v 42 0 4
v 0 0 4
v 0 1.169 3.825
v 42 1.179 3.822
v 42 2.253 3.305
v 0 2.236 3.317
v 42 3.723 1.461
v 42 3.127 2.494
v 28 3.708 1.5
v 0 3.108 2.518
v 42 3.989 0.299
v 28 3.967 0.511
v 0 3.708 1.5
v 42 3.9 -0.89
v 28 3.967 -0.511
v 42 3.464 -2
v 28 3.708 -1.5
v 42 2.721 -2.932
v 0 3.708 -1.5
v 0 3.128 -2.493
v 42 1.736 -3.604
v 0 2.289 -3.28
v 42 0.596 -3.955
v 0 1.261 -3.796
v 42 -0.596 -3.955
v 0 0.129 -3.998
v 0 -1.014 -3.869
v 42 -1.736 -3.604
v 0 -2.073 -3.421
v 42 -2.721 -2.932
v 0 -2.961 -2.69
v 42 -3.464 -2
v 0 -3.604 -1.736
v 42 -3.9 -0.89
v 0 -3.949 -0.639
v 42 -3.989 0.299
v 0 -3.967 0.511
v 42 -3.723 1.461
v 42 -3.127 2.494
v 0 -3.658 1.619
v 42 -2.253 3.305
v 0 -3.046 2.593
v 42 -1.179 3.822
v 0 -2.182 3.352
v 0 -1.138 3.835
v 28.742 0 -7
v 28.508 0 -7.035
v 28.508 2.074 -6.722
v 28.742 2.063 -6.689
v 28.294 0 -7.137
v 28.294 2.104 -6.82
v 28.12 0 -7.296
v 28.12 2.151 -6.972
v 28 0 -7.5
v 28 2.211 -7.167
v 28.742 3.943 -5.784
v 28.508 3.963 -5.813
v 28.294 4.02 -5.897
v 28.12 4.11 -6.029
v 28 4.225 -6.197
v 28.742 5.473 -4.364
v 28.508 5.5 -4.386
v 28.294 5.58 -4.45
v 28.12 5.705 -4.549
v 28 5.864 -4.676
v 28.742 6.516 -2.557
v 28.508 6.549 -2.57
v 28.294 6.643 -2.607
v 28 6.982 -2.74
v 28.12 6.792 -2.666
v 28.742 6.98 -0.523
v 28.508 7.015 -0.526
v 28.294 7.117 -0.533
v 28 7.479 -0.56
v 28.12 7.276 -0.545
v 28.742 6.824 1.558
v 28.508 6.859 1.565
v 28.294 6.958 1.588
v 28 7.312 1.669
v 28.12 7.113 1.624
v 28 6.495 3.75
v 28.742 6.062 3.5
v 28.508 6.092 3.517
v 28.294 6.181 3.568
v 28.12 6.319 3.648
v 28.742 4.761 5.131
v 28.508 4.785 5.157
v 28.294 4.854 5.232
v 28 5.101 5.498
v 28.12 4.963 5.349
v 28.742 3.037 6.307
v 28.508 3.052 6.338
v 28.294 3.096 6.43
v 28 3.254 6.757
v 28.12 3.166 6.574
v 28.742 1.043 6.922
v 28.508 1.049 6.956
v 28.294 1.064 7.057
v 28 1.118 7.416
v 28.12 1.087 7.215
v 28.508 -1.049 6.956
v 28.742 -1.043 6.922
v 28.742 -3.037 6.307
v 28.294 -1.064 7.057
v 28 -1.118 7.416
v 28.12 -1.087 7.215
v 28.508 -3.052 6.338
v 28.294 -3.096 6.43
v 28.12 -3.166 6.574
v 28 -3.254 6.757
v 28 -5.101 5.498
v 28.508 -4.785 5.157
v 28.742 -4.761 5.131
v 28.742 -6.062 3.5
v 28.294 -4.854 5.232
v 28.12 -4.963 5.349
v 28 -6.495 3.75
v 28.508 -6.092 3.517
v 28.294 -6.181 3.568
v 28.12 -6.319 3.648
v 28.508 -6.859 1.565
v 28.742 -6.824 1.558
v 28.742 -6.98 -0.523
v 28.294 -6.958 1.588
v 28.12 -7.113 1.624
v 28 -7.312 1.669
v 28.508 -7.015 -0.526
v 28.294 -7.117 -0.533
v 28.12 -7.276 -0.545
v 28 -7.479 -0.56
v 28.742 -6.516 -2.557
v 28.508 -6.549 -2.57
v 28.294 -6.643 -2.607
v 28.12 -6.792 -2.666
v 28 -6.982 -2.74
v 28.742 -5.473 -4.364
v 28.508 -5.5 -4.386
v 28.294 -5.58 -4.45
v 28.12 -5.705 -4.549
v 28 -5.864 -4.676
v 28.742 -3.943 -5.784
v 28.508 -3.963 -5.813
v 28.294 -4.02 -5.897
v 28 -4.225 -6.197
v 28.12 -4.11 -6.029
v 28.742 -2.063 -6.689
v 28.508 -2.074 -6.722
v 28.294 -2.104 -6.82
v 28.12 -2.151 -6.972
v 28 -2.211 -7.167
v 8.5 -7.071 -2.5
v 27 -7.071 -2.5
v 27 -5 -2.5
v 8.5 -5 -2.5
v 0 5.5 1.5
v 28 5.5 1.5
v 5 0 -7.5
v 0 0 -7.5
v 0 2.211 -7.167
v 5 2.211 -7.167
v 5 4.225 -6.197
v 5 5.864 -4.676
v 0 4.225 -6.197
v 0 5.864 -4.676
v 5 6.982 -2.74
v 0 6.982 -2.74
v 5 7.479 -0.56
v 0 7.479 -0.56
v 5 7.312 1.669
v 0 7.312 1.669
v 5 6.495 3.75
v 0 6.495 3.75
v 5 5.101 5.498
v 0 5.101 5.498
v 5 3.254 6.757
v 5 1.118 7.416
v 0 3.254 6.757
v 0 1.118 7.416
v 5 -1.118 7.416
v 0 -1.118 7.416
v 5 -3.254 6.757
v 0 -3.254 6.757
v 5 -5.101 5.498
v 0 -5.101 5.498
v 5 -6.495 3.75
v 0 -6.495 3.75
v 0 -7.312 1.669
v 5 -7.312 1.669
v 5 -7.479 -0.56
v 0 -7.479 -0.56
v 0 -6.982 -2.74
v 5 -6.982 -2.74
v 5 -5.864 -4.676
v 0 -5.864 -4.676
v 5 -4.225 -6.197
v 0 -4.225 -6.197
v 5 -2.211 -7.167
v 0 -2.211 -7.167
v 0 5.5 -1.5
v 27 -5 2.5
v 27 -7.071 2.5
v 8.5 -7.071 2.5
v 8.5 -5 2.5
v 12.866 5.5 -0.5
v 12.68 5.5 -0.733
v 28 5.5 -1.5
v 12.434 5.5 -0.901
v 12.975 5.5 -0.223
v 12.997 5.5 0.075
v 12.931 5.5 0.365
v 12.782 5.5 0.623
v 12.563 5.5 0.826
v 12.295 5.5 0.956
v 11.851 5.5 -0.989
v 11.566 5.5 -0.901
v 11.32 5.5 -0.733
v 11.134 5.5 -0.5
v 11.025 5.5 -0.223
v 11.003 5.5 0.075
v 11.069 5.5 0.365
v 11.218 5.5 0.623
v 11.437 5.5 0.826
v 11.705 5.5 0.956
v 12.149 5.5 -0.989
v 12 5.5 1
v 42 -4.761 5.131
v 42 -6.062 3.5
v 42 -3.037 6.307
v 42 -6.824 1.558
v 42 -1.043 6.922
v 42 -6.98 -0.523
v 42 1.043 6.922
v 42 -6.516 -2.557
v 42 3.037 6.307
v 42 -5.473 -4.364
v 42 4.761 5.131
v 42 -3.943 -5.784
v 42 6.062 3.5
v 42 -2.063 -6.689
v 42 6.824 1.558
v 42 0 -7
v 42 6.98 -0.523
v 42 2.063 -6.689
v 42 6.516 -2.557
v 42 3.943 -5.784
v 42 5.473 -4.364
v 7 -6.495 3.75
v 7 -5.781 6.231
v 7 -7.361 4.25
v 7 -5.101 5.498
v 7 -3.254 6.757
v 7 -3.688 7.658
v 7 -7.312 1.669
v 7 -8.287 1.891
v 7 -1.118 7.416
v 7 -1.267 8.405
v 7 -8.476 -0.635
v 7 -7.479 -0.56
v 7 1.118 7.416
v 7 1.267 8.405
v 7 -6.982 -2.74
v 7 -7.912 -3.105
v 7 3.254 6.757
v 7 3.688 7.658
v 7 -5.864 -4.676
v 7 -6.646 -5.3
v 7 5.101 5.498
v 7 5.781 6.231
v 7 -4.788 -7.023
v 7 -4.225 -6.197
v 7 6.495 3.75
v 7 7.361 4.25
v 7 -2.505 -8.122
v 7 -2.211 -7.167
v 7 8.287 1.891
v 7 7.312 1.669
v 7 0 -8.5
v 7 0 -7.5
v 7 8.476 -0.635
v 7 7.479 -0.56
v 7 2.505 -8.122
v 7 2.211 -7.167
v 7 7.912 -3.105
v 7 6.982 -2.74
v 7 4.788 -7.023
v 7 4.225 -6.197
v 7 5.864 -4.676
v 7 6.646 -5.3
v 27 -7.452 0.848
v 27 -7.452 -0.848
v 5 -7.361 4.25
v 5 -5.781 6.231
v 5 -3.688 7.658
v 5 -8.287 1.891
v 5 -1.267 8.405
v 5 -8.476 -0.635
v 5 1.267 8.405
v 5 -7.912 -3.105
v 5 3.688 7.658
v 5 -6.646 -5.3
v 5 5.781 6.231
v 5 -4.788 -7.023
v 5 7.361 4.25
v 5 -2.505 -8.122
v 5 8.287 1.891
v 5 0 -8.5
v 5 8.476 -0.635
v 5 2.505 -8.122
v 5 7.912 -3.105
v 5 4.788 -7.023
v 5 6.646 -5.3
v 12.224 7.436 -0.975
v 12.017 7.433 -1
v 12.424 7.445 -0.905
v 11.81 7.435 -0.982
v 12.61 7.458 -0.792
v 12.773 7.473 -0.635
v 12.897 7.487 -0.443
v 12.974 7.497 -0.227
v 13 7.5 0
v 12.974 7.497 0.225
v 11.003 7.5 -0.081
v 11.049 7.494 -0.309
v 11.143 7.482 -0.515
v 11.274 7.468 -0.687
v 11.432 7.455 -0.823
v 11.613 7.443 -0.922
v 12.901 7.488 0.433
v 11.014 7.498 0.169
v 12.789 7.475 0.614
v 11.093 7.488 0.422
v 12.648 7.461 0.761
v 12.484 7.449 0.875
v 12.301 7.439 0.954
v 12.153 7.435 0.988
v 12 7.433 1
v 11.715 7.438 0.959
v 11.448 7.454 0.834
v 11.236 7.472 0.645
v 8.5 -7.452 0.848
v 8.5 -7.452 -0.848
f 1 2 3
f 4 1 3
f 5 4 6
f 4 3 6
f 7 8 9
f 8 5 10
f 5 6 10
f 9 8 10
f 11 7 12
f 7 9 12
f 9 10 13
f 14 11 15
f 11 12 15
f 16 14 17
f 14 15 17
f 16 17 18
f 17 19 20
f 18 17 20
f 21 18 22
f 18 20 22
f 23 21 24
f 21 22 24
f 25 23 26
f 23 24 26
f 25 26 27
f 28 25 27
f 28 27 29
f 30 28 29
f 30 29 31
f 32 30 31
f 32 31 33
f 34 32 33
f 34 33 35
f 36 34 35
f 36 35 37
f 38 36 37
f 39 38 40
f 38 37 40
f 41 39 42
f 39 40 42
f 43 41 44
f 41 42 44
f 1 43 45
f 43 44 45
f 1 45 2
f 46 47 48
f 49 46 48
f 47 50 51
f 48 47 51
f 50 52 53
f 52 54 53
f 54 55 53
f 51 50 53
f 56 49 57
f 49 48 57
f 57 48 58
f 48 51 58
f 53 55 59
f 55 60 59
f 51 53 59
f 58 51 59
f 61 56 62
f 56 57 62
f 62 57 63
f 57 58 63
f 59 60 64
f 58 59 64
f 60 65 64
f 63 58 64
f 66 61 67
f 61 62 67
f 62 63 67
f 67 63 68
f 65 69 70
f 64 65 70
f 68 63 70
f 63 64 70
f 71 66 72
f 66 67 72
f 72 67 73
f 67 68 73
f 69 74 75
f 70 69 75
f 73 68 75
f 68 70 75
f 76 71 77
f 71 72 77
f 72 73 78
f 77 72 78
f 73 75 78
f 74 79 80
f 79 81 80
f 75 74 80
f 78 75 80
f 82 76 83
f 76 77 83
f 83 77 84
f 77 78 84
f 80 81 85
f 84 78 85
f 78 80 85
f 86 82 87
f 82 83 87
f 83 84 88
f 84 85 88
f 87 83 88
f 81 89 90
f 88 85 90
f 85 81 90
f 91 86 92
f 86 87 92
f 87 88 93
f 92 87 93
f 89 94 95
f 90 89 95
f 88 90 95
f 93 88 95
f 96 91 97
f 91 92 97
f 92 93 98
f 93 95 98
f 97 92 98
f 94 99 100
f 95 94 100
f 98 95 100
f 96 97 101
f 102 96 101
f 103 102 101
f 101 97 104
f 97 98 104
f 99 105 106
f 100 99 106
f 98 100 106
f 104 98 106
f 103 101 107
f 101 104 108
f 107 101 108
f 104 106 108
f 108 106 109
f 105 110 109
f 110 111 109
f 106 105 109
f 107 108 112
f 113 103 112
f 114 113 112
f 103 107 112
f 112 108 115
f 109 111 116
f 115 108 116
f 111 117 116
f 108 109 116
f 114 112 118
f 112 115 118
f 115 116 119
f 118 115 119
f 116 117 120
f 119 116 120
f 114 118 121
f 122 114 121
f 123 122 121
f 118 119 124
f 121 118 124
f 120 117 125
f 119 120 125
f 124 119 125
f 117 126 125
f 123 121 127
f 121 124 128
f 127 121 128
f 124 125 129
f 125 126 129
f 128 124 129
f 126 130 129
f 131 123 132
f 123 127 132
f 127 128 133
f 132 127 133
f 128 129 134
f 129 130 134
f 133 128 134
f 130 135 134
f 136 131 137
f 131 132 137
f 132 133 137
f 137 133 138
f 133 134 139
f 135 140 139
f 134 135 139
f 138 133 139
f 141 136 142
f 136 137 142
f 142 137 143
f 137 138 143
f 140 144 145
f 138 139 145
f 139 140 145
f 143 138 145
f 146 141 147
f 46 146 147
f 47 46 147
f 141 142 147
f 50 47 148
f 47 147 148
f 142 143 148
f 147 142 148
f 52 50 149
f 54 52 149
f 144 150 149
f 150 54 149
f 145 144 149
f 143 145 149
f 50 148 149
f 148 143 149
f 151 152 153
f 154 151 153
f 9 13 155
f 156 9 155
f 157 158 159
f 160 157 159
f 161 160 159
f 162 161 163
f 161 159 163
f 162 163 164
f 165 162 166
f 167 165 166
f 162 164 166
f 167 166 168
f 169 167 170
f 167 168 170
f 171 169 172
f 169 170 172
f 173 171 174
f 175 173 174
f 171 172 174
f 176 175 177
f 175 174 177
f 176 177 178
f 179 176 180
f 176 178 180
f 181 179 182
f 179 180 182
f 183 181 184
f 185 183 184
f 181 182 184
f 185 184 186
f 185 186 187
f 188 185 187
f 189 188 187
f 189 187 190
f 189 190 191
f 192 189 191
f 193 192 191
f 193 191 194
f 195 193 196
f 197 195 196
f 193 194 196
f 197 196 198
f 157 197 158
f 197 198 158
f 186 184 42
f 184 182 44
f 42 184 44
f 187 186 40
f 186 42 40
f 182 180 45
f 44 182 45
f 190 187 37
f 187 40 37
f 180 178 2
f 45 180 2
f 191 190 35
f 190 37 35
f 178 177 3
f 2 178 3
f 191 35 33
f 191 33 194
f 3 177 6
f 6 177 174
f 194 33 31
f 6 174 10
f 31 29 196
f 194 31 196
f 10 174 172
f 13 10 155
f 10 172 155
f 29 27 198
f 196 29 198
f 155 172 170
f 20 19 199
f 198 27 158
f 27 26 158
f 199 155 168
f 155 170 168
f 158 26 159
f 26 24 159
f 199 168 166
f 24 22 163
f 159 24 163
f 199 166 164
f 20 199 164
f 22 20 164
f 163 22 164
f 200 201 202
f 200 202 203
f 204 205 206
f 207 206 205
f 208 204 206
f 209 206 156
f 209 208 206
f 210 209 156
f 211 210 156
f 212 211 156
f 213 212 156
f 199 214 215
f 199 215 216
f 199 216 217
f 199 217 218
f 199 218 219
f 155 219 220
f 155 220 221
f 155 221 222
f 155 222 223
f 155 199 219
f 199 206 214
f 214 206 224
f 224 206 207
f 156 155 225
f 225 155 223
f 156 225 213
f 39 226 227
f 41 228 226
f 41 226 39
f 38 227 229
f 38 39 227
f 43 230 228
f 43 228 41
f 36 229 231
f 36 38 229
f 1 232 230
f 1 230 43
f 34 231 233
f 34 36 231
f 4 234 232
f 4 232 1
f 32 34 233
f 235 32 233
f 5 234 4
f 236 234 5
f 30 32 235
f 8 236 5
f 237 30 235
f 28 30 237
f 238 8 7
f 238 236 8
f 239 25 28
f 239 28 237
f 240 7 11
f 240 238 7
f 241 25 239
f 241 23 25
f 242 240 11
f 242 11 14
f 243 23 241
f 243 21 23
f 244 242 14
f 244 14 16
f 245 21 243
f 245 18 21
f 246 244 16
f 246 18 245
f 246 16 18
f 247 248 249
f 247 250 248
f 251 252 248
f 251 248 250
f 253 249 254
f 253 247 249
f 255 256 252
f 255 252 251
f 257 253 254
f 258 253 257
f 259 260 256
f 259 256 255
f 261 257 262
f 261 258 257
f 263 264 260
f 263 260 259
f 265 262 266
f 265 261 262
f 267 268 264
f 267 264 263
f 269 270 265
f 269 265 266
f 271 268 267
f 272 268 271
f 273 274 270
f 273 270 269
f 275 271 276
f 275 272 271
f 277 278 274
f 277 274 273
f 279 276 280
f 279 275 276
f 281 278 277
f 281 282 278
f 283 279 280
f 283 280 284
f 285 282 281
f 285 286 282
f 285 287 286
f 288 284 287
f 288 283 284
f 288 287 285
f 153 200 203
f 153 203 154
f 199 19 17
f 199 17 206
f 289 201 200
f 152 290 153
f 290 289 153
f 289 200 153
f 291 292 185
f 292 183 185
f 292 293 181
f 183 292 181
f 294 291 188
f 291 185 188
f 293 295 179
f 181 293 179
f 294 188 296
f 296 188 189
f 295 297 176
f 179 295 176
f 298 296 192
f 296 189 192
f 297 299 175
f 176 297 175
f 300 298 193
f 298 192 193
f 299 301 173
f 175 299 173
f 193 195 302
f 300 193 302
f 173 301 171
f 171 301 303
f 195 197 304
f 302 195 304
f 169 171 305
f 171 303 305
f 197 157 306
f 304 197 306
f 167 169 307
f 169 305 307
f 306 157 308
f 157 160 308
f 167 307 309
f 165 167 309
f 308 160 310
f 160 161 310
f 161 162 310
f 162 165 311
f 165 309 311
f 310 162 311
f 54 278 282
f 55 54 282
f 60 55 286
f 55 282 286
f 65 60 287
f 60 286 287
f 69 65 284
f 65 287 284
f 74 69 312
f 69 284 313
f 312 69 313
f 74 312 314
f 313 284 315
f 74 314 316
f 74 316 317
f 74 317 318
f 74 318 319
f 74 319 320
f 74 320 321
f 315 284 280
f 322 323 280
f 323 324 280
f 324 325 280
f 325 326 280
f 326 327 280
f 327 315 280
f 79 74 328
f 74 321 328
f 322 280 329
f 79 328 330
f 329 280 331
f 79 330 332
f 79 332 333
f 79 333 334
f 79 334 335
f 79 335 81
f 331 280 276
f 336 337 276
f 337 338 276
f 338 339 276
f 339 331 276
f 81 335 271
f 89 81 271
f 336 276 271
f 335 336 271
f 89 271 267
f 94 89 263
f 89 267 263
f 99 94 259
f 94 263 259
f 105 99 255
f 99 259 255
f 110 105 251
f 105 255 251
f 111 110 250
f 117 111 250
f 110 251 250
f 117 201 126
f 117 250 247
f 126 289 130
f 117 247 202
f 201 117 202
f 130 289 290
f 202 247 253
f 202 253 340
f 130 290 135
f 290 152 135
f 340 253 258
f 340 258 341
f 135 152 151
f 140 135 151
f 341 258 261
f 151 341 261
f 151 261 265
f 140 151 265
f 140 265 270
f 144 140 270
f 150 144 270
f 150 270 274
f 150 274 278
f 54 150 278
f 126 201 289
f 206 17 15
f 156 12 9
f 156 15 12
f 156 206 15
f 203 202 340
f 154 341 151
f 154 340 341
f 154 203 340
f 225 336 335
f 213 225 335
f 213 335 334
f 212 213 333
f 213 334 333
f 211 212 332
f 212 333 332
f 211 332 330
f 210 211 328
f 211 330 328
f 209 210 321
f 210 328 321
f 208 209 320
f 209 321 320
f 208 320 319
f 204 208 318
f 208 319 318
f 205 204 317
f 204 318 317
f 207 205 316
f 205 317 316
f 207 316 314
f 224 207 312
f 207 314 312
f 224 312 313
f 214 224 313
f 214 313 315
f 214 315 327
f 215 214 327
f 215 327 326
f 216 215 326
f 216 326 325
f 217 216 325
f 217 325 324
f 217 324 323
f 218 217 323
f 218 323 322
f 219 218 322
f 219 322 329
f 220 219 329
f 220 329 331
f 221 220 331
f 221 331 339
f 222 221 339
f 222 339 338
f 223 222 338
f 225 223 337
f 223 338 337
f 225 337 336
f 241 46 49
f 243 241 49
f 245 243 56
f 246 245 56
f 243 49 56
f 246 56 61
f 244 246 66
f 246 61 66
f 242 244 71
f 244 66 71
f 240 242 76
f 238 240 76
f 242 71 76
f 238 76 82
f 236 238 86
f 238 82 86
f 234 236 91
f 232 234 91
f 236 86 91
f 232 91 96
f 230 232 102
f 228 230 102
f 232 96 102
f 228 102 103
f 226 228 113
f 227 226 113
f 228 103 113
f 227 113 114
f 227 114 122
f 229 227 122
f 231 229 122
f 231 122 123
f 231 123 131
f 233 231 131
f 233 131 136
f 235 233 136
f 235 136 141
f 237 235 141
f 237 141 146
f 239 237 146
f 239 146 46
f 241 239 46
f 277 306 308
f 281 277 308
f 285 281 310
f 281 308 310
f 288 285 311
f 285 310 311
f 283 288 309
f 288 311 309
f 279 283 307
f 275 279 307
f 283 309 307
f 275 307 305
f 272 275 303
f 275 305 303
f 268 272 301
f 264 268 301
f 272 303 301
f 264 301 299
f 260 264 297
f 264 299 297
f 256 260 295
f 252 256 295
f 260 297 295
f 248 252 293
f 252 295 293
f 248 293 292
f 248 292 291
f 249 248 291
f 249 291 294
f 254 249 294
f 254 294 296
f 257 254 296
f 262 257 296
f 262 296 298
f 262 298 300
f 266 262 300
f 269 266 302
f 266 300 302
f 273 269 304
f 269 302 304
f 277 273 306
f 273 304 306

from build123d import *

# Parameters (mm, degrees)
SKETCH1_R               = 7.5
BOSS_EXTRUDE1_DEPTH     = 5
SKETCH2_R               = 8.5
BOSS_EXTRUDE2_DEPTH     = 2
SKETCH3_R               = 7.5
BOSS_EXTRUDE3_DEPTH     = 35
SKETCH4_R               = 4
CUT_EXTRUDE1_DEPTH      = 44.686382318
CUT_EXTRUDE3_REACH      = 47.741
CUT_EXTRUDE3_END_RADIUS = 4
SKETCH7_R               = 1
CUT_EXTRUDE6_START      = -14
SKETCH9_R               = 7.5
SKETCH9_R_2             = 7
CUT_EXTRUDE6_DEPTH      = 14
FILLET1_R               = 0.8
SKETCH10_W              = 3
SKETCH10_H              = 3
CUT_EXTRUDE7_DEPTH      = 28
SKETCH12_W              = 5
SKETCH12_H              = 5
CUT_EXTRUDE8_DEPTH      = 18.5


with BuildPart() as part:
    # Sketch1 → Boss-Extrude1 (new body)
    with BuildSketch(Plane(origin=(0, 0, 0), x_dir=(0, 0, -1), z_dir=(1, 0, 0))):
        Circle(SKETCH1_R)
    extrude(amount=BOSS_EXTRUDE1_DEPTH)

    # Sketch2 → Boss-Extrude2 (add)
    with BuildSketch(Plane(origin=(5, 0, 0), x_dir=(0, 0, -1), z_dir=(1, 0, 0))):
        Circle(SKETCH2_R)
    extrude(amount=BOSS_EXTRUDE2_DEPTH)

    # Sketch3 → Boss-Extrude3 (add)
    with BuildSketch(Plane(origin=(7, 0, 0), x_dir=(0, 0, -1), z_dir=(1, 0, 0))):
        Circle(SKETCH3_R)
    extrude(amount=BOSS_EXTRUDE3_DEPTH)

    # Sketch4 → Cut-Extrude1 (cut, through all)
    with BuildSketch(Plane.ZY):
        Circle(SKETCH4_R)
    extrude(amount=-CUT_EXTRUDE1_DEPTH, mode=Mode.SUBTRACT)

    # Cut-Extrude3: up to this cylinder (the profile starts outside it)
    cut_extrude3_end = Plane(origin=(12, 0, 0), z_dir=(-1, 0, 0)) * Cylinder(CUT_EXTRUDE3_END_RADIUS, 104.482, mode=Mode.PRIVATE)
    # Sketch7 → Cut-Extrude3 (cut, up to the surface)
    with BuildSketch(Plane(origin=(0, 7.5, 0), x_dir=(1, 0, 0), z_dir=(0, 1, 0)), mode=Mode.PRIVATE) as cut_extrude3_sk1:
        with Locations(Location((12, 0, 0), (0, 0, 270))):
            Circle(SKETCH7_R)
    cut_extrude3_tool1 = extrude(cut_extrude3_sk1.sketch, amount=-CUT_EXTRUDE3_REACH, mode=Mode.PRIVATE) - cut_extrude3_end
    add(cut_extrude3_tool1.solids().sort_by_distance((12, 7.5, 0))[0], mode=Mode.SUBTRACT)

    # Sketch9 → Cut-Extrude6 (cut)
    with BuildSketch(Plane(origin=(42, 0, 0), x_dir=(0, 0, -1), z_dir=(1, 0, 0)).offset(CUT_EXTRUDE6_START)):
        Circle(SKETCH9_R)
        Circle(SKETCH9_R_2, mode=Mode.SUBTRACT)
    extrude(amount=CUT_EXTRUDE6_DEPTH, mode=Mode.SUBTRACT)

    # Fillet1
    # the kernel refuses this fillet: 0.8 mm, written as the material it adds along each edge
    with BuildSketch(Plane(origin=(28, 0, 0), x_dir=(0, 0, -1), z_dir=(0, -1, 0))) as fillet1_piece_1:
        with BuildLine():
            CenterArc((7.8, 0.741619849), FILLET1_R, 180, 67.975687163)
            Line((7, 0.741619849), (6.984, 0.741619849))
            Line((6.984, 0.741619849), (6.984, 0))
            Line((6.984, 0), (7, -0.016))
            ThreePointArc((7, -0.016), (7.25, -0.016), (7.494, -0.014832397))
            Line((7.494, -0.014832397), (7.5, 0))
        make_face()
    revolve(axis=Axis((28, 0, 0), (1, 0, 0)))

    # Sketch10 → Cut-Extrude7 (cut)
    with BuildSketch(Plane.ZY):
        with Locations((0, 4)):
            Rectangle(SKETCH10_W, SKETCH10_H)
    extrude(amount=-CUT_EXTRUDE7_DEPTH, mode=Mode.SUBTRACT)

    # Sketch12 → Cut-Extrude8 (cut)
    with BuildSketch(Plane(origin=(27, 0, 0), x_dir=(0, 0, -1), z_dir=(1, 0, 0))):
        with Locations((0, -7.5)):
            Rectangle(SKETCH12_W, SKETCH12_H)
    extrude(amount=-CUT_EXTRUDE8_DEPTH, mode=Mode.SUBTRACT)


solid = part.part
